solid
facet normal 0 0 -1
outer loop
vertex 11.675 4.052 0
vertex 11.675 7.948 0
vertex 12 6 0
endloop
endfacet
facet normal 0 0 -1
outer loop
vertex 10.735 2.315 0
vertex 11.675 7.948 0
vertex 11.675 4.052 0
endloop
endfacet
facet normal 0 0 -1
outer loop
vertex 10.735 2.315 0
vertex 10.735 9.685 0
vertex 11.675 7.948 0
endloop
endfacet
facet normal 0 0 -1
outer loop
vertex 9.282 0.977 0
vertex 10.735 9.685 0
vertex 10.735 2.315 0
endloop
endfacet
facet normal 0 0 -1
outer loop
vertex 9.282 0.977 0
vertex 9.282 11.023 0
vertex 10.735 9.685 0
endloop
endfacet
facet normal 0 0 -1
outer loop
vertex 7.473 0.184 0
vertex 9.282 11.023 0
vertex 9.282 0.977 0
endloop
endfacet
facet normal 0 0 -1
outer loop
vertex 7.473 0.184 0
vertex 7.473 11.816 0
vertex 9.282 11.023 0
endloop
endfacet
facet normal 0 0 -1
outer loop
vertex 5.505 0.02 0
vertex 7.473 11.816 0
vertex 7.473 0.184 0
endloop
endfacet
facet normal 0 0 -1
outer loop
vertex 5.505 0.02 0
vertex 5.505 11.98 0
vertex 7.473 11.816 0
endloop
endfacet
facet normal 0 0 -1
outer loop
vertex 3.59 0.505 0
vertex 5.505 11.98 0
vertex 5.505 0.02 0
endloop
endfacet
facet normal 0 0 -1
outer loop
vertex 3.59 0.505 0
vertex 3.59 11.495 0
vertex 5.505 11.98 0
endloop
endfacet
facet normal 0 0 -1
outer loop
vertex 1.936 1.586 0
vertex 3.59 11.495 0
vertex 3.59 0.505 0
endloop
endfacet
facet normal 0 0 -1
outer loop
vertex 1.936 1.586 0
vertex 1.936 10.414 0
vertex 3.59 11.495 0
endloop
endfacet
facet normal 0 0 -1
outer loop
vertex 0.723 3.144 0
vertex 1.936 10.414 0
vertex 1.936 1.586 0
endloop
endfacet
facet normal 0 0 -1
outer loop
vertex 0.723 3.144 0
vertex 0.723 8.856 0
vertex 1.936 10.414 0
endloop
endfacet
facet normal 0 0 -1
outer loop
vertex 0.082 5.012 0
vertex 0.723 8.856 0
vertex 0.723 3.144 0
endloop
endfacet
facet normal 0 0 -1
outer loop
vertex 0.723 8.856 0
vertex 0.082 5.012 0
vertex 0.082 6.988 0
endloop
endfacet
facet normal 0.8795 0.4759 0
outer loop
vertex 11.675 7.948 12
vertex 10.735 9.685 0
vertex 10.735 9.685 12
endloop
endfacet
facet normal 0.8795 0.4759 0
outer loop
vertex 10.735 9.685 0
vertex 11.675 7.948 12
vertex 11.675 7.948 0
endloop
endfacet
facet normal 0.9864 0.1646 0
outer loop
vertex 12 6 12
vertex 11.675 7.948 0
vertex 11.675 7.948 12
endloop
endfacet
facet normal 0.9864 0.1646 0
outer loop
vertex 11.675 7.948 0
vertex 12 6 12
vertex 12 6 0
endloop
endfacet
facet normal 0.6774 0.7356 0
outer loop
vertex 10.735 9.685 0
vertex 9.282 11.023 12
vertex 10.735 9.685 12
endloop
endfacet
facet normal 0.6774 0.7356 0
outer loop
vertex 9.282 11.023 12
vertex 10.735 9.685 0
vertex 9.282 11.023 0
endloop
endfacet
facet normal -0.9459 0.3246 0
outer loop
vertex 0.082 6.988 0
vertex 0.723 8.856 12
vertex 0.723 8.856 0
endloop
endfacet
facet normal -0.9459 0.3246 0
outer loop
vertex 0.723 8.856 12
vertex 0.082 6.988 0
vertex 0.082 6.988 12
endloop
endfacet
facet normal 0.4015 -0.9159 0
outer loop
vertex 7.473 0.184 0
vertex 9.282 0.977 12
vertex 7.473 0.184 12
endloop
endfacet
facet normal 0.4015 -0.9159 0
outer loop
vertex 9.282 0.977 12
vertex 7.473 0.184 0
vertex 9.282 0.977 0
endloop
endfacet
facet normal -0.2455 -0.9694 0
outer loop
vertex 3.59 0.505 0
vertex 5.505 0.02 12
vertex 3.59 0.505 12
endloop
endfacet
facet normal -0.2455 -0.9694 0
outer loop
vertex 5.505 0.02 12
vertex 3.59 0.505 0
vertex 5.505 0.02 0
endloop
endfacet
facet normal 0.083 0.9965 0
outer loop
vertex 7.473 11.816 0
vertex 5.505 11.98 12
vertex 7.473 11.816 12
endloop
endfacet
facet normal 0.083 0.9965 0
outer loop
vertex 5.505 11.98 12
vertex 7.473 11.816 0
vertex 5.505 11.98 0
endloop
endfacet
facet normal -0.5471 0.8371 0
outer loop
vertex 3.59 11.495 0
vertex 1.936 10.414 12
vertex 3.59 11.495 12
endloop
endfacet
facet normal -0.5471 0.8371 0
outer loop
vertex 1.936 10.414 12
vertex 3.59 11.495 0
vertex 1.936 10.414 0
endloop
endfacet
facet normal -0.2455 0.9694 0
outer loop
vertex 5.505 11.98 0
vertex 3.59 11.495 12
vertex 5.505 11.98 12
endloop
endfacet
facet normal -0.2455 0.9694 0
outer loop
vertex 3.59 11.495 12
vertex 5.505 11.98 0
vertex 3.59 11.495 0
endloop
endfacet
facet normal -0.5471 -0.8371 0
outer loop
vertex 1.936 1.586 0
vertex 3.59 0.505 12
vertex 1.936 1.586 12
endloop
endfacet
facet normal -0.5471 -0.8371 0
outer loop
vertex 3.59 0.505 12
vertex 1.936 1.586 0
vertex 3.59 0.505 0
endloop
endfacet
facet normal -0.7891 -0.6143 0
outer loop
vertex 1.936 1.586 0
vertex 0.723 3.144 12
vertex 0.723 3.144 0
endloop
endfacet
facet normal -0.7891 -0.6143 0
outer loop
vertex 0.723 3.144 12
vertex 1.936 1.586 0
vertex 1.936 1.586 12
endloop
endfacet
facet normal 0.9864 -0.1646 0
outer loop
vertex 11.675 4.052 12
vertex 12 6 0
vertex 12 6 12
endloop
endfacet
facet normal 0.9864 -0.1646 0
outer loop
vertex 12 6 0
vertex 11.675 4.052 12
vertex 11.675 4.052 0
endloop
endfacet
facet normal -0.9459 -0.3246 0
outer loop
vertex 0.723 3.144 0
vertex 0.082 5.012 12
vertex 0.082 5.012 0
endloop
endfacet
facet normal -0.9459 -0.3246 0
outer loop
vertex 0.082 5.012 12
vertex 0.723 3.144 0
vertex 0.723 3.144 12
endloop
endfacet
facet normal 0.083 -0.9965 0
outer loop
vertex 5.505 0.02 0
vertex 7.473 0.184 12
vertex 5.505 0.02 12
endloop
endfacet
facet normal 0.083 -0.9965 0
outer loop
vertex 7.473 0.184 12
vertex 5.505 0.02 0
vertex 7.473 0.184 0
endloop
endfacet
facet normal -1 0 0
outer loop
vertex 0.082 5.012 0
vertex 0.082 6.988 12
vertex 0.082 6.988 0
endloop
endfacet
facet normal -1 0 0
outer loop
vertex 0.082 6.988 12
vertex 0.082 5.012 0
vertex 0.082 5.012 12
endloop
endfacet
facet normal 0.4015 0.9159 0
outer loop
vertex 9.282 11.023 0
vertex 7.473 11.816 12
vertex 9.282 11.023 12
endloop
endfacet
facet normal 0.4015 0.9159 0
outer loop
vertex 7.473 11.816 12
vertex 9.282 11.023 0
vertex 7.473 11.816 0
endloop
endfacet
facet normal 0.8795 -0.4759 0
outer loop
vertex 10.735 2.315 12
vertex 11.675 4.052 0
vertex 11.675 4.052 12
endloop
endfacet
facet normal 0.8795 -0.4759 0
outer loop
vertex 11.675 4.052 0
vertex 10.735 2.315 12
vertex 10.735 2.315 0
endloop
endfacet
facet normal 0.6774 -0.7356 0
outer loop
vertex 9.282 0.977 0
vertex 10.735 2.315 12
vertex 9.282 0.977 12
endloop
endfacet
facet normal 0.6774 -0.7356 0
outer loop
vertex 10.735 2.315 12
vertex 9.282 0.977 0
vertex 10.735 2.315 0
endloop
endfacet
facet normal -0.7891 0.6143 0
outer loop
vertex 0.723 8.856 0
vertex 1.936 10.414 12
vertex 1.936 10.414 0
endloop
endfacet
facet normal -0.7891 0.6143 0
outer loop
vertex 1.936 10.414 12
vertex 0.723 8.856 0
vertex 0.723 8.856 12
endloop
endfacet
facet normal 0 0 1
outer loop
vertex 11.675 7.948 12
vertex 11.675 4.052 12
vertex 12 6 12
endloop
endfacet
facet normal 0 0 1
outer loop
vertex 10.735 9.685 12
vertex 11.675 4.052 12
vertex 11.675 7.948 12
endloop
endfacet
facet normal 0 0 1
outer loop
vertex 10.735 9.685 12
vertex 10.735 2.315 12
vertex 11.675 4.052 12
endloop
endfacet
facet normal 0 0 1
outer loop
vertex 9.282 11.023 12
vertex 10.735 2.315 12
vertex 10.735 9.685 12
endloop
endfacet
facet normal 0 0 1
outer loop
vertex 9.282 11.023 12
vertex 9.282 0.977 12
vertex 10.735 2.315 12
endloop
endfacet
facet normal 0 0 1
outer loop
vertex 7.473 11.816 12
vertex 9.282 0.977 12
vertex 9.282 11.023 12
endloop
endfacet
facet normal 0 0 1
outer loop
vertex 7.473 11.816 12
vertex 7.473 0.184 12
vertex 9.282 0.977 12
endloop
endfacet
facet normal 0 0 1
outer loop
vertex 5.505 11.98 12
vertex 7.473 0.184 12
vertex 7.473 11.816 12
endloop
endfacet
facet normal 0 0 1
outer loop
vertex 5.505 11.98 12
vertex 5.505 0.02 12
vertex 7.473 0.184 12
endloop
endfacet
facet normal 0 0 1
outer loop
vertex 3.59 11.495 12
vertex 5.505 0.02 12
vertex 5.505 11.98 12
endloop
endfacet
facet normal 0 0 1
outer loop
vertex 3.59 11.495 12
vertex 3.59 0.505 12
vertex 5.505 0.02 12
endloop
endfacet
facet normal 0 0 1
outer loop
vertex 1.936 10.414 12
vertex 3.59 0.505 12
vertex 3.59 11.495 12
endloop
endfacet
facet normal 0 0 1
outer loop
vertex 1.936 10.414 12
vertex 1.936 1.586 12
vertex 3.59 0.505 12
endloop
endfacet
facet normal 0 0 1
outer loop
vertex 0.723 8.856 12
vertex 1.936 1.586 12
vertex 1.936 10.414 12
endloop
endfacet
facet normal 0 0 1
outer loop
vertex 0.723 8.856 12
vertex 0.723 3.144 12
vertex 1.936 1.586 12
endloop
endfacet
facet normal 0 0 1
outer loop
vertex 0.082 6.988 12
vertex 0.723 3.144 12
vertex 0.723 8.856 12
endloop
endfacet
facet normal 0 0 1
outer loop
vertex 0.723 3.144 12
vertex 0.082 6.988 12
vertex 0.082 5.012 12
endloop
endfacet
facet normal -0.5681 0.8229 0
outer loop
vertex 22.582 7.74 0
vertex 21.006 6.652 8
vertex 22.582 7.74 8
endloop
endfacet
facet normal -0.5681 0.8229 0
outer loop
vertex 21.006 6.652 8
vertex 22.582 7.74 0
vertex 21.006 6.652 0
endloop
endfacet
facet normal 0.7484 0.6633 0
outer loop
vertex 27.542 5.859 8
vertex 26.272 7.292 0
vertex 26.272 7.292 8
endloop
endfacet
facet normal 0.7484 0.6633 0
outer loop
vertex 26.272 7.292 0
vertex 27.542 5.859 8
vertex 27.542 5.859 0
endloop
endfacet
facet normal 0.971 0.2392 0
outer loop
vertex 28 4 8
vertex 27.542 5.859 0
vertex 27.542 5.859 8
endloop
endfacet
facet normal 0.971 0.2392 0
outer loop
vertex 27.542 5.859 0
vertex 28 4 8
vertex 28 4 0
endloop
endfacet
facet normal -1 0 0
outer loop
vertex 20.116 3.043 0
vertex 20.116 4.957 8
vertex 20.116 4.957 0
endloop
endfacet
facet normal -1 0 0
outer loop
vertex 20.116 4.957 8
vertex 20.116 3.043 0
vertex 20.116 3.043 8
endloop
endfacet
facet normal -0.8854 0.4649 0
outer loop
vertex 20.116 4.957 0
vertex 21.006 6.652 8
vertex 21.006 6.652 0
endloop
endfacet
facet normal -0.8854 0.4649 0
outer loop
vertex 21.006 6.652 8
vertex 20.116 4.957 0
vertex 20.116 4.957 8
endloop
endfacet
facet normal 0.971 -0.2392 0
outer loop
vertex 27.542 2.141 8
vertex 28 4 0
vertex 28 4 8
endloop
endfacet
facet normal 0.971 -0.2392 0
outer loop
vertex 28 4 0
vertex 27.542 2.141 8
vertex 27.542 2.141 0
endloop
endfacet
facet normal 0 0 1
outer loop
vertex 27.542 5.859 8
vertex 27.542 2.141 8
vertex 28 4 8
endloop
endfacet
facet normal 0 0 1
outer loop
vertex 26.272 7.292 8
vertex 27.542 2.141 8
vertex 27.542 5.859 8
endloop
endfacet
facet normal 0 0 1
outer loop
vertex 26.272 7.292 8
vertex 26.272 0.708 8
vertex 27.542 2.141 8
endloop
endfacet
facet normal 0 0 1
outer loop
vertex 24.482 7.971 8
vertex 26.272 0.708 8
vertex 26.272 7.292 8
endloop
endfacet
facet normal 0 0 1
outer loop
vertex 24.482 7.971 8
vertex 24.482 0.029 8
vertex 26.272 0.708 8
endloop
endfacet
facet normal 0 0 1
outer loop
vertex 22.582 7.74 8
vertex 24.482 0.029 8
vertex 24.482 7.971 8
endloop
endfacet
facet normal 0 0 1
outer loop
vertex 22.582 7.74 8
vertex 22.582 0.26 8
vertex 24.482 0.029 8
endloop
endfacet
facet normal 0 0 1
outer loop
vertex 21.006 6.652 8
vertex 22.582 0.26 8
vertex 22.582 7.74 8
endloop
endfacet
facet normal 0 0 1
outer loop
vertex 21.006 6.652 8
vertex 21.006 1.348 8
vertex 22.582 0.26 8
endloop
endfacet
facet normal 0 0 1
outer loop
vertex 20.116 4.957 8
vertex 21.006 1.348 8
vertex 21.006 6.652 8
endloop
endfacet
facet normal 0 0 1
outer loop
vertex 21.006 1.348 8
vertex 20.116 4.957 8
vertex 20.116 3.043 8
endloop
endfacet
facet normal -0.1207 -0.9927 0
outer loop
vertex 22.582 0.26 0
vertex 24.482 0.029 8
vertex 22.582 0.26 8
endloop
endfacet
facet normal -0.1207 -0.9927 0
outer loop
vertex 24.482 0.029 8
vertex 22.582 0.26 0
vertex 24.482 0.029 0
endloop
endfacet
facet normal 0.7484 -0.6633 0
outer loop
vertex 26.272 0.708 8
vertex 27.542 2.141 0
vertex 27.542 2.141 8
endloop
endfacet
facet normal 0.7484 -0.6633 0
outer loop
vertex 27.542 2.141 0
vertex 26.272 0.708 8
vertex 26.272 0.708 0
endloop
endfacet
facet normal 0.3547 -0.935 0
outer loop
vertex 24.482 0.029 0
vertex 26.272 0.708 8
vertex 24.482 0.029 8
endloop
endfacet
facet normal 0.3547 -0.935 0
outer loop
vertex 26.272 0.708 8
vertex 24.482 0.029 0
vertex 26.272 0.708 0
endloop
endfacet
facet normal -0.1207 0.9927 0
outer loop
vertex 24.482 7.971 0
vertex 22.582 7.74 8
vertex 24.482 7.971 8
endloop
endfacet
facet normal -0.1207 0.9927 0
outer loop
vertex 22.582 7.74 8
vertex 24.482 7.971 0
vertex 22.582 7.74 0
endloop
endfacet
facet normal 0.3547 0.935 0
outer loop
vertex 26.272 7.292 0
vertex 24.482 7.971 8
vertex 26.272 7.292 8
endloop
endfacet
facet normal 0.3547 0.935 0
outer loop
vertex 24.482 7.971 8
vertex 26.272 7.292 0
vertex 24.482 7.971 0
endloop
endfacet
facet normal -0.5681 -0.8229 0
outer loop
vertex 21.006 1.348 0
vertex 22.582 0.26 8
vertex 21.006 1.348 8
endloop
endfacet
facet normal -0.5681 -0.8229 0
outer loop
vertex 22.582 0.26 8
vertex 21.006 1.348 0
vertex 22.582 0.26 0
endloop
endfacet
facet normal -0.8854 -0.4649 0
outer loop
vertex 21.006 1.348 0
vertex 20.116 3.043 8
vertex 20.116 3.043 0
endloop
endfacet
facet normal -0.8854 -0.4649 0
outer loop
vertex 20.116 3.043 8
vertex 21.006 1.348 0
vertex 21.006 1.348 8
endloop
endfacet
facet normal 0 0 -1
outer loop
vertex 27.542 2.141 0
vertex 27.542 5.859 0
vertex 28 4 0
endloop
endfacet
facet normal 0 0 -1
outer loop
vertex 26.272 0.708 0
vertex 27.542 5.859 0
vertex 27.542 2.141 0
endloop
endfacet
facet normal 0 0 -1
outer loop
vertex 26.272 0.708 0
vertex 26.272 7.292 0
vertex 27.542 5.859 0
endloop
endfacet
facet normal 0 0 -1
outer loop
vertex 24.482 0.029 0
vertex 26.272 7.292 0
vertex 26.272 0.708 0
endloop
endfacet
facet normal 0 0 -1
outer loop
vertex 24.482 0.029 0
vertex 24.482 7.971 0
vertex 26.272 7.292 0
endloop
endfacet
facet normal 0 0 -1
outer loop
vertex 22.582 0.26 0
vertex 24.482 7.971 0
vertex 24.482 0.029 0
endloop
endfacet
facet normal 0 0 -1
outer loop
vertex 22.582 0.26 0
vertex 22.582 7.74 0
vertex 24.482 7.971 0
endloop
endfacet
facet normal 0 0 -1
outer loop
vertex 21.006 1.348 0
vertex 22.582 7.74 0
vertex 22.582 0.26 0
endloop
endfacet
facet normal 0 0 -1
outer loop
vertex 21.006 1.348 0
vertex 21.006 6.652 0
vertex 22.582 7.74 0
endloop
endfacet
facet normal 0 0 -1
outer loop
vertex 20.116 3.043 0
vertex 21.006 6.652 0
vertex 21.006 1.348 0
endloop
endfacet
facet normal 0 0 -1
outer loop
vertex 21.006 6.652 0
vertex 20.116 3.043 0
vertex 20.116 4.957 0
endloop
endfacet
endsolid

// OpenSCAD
module movingPart(s) {
    wantCube=0;
    if (wantCube) {
        cube([s,s,s]);
    } else {
        translate([s/2,s/2,0])
            cylinder(d=s,h=s); 
    }
    
    
}

translate([0,0,0]) {
    movingPart(12);
}

translate([20,0,0]) {
    movingPart(8);
}
